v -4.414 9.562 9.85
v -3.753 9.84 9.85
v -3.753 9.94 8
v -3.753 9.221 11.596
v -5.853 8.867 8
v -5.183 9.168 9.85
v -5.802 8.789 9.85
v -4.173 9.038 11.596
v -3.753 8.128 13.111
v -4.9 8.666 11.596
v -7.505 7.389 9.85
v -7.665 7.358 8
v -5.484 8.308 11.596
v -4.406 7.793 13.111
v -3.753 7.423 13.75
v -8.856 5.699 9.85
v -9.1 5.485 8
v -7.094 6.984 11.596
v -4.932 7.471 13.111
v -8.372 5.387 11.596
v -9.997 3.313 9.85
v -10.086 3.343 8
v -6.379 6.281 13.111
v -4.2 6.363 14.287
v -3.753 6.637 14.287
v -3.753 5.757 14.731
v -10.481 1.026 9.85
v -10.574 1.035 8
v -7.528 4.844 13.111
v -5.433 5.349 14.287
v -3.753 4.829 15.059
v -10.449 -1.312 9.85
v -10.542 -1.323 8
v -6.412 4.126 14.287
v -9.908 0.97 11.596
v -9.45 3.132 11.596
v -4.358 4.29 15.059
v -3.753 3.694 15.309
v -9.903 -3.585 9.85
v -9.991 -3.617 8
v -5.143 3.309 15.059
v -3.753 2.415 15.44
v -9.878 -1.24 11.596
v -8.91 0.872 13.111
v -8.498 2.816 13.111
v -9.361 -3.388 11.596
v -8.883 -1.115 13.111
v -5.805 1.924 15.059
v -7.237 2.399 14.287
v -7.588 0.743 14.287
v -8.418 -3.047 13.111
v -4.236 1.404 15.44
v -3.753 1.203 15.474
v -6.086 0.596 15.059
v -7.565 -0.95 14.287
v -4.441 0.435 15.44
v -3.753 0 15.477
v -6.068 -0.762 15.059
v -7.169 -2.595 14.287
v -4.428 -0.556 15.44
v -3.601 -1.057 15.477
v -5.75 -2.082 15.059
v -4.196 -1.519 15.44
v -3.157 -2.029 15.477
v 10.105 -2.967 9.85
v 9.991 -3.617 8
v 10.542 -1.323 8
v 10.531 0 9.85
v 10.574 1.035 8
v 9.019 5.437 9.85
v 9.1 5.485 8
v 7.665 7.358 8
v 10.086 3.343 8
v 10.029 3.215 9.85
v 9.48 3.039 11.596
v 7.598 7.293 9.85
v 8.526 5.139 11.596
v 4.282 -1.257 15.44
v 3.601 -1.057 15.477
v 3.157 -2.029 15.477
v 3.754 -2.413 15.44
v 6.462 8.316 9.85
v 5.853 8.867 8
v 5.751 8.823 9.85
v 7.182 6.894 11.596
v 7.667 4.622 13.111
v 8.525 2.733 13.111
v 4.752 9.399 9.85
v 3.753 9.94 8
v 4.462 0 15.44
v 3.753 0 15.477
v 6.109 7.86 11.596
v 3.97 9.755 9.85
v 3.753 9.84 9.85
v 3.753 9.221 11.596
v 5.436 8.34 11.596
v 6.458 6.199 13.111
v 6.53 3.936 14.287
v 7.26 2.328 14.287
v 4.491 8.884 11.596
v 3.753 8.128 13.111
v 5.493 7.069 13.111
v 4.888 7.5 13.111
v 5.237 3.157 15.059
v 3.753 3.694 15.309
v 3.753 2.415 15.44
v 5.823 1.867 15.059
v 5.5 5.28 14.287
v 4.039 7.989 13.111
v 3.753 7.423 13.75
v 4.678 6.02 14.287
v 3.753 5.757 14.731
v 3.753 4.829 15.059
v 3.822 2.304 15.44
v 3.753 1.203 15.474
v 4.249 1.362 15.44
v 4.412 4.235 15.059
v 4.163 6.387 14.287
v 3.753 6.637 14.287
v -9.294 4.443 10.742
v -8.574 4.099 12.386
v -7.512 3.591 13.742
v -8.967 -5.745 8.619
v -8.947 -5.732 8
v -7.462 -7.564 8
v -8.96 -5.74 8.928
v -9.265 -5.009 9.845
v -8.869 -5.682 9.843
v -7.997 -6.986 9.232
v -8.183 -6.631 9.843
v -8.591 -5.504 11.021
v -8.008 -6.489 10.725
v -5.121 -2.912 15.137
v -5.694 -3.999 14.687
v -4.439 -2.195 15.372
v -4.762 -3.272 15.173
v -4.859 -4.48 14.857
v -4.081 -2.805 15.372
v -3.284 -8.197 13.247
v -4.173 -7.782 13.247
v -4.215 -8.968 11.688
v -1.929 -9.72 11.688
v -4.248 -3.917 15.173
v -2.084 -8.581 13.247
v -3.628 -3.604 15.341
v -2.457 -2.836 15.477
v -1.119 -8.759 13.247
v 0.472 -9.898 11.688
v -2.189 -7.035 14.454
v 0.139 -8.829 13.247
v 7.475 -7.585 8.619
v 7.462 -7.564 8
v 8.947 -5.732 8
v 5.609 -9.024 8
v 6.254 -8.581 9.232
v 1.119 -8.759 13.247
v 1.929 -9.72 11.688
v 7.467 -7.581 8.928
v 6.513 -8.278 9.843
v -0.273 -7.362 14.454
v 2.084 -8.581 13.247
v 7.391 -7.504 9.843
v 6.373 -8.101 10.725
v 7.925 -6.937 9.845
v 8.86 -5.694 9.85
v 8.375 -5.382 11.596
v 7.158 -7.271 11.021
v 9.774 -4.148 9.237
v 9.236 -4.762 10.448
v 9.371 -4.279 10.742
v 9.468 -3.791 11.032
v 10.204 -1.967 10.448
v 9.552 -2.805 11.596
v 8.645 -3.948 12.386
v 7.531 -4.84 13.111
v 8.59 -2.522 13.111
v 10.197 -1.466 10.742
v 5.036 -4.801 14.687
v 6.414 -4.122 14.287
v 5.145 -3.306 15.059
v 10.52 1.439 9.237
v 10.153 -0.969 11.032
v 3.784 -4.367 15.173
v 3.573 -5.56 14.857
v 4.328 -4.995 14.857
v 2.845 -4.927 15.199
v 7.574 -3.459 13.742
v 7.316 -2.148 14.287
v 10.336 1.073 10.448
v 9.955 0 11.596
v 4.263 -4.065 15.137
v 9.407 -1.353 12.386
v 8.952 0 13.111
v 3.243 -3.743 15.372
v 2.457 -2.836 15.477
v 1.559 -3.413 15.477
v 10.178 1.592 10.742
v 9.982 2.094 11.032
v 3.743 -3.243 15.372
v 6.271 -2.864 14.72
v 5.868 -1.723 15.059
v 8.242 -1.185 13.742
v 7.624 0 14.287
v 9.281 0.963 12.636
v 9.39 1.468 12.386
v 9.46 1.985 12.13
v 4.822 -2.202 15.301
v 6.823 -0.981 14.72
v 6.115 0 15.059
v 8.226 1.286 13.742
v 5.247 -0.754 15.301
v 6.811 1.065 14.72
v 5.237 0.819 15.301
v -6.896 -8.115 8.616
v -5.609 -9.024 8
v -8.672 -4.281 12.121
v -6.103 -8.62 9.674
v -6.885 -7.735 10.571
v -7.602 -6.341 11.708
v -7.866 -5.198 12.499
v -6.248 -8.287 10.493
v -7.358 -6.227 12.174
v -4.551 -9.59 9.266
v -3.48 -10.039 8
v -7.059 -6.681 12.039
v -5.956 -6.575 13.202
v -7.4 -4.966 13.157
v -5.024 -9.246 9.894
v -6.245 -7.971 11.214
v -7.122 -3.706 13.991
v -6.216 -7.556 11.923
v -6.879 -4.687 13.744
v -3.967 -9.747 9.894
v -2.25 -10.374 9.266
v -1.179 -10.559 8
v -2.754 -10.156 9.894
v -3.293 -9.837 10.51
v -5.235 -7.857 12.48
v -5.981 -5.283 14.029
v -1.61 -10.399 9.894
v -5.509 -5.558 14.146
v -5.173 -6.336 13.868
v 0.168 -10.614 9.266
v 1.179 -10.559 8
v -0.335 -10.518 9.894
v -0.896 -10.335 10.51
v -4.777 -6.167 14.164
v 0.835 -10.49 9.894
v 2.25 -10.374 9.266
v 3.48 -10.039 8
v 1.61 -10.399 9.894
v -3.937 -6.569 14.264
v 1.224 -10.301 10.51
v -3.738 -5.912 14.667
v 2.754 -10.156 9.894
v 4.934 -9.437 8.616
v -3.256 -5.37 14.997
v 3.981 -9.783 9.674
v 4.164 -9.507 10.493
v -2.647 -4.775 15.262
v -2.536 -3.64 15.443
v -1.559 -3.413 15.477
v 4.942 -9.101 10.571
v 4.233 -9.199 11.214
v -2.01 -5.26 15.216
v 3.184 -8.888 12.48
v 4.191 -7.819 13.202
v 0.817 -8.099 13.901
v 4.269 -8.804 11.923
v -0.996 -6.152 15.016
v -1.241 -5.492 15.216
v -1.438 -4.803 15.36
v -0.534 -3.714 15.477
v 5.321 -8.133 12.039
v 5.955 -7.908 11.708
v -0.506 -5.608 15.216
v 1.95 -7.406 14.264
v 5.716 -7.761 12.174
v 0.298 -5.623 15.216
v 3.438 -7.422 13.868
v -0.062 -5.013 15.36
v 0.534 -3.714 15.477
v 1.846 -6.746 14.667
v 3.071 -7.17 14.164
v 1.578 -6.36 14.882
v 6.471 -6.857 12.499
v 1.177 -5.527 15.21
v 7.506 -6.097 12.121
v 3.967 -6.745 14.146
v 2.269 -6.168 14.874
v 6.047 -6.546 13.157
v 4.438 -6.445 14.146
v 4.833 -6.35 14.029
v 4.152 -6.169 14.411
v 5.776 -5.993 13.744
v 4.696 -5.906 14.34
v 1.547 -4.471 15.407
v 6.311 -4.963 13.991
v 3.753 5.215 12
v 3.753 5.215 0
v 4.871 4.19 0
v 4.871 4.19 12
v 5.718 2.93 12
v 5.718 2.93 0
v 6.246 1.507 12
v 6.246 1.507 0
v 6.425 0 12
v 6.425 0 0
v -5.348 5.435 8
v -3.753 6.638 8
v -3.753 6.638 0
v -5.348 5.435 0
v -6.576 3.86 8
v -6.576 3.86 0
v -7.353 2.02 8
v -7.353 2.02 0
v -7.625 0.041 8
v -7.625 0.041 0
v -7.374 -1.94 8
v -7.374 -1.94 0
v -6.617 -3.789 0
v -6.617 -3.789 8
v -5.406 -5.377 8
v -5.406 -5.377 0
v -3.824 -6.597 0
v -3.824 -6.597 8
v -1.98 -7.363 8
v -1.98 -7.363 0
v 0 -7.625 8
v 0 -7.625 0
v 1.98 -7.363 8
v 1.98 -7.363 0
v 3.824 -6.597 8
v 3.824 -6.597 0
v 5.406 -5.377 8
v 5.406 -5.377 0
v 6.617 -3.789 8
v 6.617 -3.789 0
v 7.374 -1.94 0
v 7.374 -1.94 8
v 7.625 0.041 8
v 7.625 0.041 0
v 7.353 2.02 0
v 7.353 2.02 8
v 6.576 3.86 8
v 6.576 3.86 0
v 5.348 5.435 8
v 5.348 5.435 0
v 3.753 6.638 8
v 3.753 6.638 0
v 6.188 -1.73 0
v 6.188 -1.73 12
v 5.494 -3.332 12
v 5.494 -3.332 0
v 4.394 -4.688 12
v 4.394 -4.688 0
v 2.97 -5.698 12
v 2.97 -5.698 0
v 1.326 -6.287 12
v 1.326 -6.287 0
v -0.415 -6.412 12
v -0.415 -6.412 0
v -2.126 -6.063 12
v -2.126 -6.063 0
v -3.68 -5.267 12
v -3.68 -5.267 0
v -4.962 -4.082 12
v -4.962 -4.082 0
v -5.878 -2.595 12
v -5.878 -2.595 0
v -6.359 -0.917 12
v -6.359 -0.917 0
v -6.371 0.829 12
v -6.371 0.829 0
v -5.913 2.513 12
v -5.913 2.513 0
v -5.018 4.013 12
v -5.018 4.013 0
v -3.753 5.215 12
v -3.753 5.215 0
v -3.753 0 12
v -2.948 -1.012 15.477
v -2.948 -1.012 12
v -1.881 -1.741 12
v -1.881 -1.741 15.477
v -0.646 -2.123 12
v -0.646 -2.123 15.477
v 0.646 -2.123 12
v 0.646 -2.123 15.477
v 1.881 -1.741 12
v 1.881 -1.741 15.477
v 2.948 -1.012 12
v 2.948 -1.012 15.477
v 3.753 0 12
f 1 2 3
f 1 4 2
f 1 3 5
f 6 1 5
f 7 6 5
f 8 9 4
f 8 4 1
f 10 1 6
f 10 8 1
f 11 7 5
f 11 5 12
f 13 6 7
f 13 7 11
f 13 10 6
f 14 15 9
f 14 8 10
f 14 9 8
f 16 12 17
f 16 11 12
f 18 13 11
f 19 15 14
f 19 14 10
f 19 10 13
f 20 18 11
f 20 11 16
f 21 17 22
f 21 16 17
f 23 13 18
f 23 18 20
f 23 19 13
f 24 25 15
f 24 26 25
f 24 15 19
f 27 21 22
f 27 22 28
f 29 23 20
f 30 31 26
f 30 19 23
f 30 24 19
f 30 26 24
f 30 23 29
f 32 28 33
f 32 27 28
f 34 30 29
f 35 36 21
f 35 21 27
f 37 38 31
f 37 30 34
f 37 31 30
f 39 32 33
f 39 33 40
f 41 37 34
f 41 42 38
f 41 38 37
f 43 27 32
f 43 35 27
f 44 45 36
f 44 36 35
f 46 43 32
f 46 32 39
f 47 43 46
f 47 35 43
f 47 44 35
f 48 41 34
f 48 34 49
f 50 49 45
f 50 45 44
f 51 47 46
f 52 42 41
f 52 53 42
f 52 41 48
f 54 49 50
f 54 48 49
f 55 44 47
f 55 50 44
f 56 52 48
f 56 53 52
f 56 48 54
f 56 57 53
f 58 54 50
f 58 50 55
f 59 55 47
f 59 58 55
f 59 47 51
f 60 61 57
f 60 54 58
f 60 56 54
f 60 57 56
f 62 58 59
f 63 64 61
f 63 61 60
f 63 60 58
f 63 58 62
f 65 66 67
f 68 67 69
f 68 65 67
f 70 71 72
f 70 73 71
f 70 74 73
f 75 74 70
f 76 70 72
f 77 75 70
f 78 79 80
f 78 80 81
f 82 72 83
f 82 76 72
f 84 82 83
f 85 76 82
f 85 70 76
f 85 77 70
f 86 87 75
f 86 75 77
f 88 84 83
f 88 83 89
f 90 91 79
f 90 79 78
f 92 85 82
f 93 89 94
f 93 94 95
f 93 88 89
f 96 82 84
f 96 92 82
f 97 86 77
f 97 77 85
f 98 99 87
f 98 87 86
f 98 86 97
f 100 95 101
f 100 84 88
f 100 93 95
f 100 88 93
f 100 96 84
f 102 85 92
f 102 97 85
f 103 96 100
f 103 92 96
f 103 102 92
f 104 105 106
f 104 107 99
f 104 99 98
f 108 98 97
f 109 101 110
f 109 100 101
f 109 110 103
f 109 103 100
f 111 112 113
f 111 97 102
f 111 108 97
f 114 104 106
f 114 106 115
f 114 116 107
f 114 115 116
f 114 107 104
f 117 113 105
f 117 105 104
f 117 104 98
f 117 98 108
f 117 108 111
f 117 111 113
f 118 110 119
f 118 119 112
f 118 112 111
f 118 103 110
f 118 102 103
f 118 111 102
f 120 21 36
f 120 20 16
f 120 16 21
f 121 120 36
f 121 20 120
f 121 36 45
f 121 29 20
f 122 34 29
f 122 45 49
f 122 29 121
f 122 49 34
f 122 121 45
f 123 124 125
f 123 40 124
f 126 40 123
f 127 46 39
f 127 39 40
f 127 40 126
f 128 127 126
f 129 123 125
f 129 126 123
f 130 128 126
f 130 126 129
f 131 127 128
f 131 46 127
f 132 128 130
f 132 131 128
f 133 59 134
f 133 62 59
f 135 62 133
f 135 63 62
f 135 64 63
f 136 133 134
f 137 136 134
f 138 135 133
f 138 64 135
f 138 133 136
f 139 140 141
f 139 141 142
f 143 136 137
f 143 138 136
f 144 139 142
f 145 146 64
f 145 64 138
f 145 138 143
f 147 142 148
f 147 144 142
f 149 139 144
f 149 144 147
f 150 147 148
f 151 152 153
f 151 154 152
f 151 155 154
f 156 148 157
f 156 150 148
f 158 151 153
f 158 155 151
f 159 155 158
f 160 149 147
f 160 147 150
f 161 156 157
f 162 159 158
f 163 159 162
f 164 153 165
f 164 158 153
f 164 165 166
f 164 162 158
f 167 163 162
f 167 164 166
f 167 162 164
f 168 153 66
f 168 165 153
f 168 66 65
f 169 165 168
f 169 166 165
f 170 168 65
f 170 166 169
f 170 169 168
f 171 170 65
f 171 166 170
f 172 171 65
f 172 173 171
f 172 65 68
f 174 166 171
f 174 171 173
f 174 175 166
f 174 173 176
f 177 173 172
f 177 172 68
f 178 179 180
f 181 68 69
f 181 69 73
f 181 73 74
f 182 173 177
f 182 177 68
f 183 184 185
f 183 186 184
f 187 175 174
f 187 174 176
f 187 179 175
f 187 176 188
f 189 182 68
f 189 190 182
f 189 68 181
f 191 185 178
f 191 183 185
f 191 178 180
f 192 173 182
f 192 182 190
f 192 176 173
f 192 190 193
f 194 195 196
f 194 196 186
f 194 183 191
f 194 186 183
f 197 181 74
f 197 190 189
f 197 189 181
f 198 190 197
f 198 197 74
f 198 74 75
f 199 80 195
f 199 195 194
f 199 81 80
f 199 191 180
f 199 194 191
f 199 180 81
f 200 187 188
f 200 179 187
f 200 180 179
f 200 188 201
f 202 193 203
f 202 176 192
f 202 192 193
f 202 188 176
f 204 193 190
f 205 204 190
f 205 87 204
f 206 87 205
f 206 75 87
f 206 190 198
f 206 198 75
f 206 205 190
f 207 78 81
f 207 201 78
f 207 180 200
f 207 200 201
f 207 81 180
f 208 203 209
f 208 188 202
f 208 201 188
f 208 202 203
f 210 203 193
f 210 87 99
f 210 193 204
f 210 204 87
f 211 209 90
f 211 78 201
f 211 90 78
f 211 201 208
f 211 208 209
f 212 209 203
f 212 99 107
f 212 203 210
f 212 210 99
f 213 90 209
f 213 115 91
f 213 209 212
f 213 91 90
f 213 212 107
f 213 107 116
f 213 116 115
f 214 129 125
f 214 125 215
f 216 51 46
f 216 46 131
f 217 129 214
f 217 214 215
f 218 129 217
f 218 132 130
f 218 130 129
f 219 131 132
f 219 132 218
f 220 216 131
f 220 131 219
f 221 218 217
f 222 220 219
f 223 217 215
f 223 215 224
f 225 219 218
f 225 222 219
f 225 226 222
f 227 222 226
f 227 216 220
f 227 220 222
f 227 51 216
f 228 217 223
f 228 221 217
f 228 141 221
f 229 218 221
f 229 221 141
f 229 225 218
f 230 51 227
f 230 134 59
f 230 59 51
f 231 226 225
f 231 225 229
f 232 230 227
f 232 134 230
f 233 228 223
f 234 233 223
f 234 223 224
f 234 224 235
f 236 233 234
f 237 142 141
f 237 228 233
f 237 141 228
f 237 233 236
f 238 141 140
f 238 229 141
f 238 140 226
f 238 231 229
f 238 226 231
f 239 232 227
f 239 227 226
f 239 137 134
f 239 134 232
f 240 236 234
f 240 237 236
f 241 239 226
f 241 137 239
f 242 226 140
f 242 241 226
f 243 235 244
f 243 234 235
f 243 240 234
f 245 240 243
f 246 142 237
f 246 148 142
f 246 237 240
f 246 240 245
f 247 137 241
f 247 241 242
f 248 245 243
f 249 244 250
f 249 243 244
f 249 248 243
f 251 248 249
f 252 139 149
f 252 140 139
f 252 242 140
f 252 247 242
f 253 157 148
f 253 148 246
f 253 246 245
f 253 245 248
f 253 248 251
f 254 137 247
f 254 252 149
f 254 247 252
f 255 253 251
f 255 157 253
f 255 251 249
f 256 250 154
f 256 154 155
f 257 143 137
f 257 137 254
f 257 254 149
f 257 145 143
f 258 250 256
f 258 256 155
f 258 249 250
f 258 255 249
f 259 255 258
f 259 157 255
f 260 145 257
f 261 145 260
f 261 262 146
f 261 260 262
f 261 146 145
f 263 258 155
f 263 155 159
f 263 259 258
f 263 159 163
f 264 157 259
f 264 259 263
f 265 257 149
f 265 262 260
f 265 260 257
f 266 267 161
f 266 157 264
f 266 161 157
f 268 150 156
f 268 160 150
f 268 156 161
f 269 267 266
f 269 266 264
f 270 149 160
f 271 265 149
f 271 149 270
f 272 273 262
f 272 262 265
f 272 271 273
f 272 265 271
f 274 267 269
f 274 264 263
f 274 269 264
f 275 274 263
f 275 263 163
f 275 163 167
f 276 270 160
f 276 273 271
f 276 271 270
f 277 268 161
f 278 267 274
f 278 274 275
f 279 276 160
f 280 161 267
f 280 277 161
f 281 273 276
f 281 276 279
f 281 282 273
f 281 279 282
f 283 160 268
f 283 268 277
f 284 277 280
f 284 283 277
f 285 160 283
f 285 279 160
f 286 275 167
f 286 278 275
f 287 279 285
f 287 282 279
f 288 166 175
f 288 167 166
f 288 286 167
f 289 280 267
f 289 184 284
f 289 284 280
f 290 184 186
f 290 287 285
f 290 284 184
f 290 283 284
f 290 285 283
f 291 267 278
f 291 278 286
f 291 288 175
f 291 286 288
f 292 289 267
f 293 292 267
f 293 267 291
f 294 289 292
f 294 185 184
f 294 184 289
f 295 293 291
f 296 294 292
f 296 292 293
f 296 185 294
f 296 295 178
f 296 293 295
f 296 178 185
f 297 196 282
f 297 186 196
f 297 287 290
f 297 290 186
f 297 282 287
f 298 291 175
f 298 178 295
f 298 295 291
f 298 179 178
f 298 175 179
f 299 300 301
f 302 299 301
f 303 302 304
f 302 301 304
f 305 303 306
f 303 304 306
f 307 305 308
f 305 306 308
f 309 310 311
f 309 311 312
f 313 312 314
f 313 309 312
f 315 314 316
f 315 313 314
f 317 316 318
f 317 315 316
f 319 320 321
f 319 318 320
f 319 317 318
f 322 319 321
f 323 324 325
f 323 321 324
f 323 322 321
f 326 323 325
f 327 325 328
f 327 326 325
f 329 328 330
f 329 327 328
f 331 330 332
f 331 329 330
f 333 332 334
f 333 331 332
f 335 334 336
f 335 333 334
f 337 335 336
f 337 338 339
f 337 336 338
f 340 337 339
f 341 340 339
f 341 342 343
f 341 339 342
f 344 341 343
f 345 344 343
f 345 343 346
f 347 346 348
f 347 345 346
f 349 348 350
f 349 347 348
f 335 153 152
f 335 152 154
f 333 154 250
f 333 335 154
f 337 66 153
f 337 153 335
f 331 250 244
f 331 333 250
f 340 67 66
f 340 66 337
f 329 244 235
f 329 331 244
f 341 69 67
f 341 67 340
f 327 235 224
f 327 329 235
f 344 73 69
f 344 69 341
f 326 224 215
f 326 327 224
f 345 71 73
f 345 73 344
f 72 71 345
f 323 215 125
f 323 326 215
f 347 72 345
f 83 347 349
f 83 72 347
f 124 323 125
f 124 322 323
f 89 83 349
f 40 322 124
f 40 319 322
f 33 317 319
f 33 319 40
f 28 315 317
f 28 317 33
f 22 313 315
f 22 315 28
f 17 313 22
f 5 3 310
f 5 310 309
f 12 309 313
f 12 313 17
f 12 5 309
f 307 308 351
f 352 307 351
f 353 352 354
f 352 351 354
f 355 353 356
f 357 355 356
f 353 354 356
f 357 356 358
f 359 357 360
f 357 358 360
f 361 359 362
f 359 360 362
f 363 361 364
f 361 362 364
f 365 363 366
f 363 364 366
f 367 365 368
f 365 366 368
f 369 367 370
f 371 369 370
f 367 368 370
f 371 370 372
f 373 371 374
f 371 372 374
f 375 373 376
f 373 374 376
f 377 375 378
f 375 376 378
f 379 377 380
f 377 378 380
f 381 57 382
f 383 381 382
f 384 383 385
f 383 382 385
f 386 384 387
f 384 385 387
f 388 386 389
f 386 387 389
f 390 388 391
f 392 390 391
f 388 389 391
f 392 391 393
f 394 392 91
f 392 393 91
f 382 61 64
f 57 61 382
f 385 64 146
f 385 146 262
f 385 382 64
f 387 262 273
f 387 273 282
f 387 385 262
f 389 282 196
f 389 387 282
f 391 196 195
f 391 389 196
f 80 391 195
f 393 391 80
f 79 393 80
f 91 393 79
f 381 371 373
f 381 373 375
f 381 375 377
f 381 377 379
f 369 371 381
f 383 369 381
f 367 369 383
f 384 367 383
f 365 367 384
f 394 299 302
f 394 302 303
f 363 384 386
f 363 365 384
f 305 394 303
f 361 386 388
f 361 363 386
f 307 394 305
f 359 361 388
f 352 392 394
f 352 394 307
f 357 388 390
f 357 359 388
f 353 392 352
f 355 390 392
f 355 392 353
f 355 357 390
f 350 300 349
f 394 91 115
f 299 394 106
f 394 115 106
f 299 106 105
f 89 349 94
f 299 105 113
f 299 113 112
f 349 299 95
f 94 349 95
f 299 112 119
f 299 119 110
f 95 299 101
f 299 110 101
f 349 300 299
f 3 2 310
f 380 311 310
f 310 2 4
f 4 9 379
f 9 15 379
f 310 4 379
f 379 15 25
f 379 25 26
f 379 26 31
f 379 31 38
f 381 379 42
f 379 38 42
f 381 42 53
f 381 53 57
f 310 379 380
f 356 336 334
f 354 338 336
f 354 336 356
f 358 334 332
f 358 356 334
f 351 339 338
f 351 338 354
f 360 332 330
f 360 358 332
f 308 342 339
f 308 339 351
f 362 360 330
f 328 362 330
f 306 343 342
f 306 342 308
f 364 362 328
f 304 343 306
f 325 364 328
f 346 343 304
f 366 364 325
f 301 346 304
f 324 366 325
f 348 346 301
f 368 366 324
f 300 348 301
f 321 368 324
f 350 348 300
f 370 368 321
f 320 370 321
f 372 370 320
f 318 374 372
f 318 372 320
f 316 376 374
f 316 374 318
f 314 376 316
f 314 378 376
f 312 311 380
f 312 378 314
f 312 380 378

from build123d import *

# Parameters (mm, degrees)
F4_DEPTH = 15.4777297208
F6_DEPTH = 12


with BuildPart() as f2:
    # F1 (on Front) → F2 (revolve)
    with BuildSketch(Plane.XZ):
        with BuildLine():
            Line((0, 15.4767297208), (0, 0))
            Line((0, 0), (7.625, 0))
            Line((7.625, 0), (7.625, 8))
            Line((7.625, 8), (10.625, 8))
            ThreePointArc((10.625, 8), (8.8302197506, 13.2471744611), (3.752507735, 15.4767297208))
            Line((3.752507735, 15.4767297208), (0, 15.4767297208))
        make_face()
    revolve(axis=Axis((0, 0, 0), (0, 0, 1)))

    # F3 (on face) → F4 (cut, through all)
    with BuildSketch(Plane.XY.offset(15.4767297208)):
        with BuildLine():
            ThreePointArc((-3.752507735, 0), (0, -2.1712493207), (3.752507735, 0))
            ThreePointArc((3.752507735, 0), (0, 3.752507735), (-3.752507735, 0))
        make_face()
        with BuildLine():
            Line((3.752507735, 0), (3.752507735, 9.9402872543))
            ThreePointArc((3.752507735, 9.9402872543), (0, 10.625), (-3.752507735, 9.9402872543))
            Line((-3.752507735, 9.9402872543), (-3.752507735, 0))
            ThreePointArc((-3.752507735, 0), (0, 3.752507735), (3.752507735, 0))
        make_face()
        with BuildLine():
            ThreePointArc((-3.752507735, 9.9402872543), (0, 10.625), (3.752507735, 9.9402872543))
            Line((3.752507735, 9.9402872543), (3.752507735, 12.1829835698))
            Line((3.752507735, 12.1829835698), (-3.752507735, 12.1829835698))
            Line((-3.752507735, 12.1829835698), (-3.752507735, 9.9402872543))
        make_face()
    extrude(amount=-F4_DEPTH, mode=Mode.SUBTRACT)

    # F5 (on face) → F6 (cut)
    with BuildSketch(Plane(origin=(0, 0, 0), x_dir=(1, 0, 0), z_dir=(0, 0, -1))):
        with BuildLine():
            ThreePointArc((3.752507735, -5.21529584), (5.7179754808, -2.9300821492), (6.425, 0))
            ThreePointArc((6.425, 0), (-2.9300821492, 5.7179754808), (-3.752507735, -5.21529584))
            Line((-3.752507735, -5.21529584), (-3.752507735, 0))
            ThreePointArc((-3.752507735, 0), (0, 2.1712493207), (3.752507735, 0))
            Line((3.752507735, 0), (3.752507735, -5.21529584))
        make_face()
        with BuildLine():
            Line((-3.752507735, 0), (-3.752507735, -5.21529584))
            ThreePointArc((-3.752507735, -5.21529584), (0, -6.425), (3.752507735, -5.21529584))
            Line((3.752507735, -5.21529584), (3.752507735, 0))
            ThreePointArc((3.752507735, 0), (0, 2.1712493207), (-3.752507735, 0))
        make_face()
    extrude(amount=-F6_DEPTH, mode=Mode.SUBTRACT)


solid = f2.part
